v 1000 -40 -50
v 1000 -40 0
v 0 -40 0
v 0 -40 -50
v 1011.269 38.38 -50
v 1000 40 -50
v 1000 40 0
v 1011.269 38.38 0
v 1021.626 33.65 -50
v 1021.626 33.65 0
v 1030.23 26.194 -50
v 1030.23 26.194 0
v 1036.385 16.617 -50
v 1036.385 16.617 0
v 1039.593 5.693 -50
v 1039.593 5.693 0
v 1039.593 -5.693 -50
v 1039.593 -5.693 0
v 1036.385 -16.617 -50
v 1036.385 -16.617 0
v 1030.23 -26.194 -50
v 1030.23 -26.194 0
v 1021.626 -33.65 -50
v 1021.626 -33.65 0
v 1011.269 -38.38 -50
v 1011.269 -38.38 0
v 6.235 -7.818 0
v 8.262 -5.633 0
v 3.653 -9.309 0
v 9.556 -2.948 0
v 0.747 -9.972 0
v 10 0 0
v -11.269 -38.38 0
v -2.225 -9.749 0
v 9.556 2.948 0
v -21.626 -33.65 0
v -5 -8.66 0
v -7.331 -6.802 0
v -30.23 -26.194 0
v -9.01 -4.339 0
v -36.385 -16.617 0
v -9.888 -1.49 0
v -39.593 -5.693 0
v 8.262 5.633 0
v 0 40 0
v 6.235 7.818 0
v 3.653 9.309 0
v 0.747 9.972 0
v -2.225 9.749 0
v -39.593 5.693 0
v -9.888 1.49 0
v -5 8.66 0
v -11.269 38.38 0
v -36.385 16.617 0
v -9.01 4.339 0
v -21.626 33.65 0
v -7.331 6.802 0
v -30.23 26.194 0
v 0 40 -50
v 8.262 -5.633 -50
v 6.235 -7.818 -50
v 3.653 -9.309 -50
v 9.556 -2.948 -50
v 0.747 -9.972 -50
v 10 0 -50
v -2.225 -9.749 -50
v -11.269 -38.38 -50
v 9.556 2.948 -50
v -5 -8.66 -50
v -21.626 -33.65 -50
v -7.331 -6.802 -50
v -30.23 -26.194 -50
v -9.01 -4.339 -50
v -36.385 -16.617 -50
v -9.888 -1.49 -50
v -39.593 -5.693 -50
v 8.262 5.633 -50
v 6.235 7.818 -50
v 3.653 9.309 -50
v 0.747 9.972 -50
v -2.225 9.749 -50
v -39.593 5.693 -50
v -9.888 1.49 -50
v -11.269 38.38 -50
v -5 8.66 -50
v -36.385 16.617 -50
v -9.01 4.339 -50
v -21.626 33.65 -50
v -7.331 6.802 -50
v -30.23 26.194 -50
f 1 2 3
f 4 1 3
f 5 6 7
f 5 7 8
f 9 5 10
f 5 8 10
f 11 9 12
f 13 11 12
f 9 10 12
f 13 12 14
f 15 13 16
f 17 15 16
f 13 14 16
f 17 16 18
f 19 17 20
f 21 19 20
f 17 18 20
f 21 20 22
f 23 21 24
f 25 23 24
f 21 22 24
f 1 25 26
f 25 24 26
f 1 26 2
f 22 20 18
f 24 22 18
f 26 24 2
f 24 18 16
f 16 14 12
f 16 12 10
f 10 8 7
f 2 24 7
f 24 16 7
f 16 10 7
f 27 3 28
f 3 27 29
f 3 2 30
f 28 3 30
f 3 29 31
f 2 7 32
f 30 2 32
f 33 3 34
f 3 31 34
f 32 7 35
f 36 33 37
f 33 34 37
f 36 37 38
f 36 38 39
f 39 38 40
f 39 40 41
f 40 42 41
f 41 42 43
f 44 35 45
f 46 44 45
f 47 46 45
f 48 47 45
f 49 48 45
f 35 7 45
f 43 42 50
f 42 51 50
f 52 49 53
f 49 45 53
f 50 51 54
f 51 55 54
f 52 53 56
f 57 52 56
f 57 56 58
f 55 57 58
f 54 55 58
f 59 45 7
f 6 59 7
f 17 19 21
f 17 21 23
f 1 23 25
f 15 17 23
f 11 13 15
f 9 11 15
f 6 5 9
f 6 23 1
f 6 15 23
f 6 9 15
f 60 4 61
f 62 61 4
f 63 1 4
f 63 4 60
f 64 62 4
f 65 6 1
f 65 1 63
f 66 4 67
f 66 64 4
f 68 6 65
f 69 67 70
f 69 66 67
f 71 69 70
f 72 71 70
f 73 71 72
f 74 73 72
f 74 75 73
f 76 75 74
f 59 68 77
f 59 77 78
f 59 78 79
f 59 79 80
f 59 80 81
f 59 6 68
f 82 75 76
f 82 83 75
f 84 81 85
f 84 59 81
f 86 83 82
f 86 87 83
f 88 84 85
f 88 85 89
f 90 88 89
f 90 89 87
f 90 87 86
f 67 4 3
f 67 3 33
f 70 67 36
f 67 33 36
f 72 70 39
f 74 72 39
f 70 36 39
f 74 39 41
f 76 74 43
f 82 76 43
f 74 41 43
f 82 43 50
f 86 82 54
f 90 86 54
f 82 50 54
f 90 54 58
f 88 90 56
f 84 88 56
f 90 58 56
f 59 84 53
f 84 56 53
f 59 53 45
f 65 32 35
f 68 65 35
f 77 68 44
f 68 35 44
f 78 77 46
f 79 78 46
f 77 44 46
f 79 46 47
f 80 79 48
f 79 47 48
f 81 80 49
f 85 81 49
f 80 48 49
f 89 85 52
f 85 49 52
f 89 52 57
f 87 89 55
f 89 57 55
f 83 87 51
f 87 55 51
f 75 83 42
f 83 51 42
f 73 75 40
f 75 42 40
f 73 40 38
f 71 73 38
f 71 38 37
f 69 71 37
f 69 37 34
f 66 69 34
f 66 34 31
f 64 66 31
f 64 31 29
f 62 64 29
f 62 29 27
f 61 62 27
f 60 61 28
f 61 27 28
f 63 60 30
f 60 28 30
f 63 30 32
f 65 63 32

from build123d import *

# Parameters (mm, degrees)
SKETCH2_R           = 10
BOSS_EXTRUDE1_DEPTH = 50


with BuildPart() as part:
    # Sketch2 → Boss-Extrude1 (new body)
    with BuildSketch(Plane.XY):
        with BuildLine():
            Line((0, 40), (1000, 40))
            ThreePointArc((1000, 40), (1040, 0), (1000, -40))
            Line((1000, -40), (0, -40))
            ThreePointArc((0, -40), (-40, 0), (0, 40))
        make_face()
        Circle(SKETCH2_R, mode=Mode.SUBTRACT)
    extrude(amount=-BOSS_EXTRUDE1_DEPTH)


solid = part.part
